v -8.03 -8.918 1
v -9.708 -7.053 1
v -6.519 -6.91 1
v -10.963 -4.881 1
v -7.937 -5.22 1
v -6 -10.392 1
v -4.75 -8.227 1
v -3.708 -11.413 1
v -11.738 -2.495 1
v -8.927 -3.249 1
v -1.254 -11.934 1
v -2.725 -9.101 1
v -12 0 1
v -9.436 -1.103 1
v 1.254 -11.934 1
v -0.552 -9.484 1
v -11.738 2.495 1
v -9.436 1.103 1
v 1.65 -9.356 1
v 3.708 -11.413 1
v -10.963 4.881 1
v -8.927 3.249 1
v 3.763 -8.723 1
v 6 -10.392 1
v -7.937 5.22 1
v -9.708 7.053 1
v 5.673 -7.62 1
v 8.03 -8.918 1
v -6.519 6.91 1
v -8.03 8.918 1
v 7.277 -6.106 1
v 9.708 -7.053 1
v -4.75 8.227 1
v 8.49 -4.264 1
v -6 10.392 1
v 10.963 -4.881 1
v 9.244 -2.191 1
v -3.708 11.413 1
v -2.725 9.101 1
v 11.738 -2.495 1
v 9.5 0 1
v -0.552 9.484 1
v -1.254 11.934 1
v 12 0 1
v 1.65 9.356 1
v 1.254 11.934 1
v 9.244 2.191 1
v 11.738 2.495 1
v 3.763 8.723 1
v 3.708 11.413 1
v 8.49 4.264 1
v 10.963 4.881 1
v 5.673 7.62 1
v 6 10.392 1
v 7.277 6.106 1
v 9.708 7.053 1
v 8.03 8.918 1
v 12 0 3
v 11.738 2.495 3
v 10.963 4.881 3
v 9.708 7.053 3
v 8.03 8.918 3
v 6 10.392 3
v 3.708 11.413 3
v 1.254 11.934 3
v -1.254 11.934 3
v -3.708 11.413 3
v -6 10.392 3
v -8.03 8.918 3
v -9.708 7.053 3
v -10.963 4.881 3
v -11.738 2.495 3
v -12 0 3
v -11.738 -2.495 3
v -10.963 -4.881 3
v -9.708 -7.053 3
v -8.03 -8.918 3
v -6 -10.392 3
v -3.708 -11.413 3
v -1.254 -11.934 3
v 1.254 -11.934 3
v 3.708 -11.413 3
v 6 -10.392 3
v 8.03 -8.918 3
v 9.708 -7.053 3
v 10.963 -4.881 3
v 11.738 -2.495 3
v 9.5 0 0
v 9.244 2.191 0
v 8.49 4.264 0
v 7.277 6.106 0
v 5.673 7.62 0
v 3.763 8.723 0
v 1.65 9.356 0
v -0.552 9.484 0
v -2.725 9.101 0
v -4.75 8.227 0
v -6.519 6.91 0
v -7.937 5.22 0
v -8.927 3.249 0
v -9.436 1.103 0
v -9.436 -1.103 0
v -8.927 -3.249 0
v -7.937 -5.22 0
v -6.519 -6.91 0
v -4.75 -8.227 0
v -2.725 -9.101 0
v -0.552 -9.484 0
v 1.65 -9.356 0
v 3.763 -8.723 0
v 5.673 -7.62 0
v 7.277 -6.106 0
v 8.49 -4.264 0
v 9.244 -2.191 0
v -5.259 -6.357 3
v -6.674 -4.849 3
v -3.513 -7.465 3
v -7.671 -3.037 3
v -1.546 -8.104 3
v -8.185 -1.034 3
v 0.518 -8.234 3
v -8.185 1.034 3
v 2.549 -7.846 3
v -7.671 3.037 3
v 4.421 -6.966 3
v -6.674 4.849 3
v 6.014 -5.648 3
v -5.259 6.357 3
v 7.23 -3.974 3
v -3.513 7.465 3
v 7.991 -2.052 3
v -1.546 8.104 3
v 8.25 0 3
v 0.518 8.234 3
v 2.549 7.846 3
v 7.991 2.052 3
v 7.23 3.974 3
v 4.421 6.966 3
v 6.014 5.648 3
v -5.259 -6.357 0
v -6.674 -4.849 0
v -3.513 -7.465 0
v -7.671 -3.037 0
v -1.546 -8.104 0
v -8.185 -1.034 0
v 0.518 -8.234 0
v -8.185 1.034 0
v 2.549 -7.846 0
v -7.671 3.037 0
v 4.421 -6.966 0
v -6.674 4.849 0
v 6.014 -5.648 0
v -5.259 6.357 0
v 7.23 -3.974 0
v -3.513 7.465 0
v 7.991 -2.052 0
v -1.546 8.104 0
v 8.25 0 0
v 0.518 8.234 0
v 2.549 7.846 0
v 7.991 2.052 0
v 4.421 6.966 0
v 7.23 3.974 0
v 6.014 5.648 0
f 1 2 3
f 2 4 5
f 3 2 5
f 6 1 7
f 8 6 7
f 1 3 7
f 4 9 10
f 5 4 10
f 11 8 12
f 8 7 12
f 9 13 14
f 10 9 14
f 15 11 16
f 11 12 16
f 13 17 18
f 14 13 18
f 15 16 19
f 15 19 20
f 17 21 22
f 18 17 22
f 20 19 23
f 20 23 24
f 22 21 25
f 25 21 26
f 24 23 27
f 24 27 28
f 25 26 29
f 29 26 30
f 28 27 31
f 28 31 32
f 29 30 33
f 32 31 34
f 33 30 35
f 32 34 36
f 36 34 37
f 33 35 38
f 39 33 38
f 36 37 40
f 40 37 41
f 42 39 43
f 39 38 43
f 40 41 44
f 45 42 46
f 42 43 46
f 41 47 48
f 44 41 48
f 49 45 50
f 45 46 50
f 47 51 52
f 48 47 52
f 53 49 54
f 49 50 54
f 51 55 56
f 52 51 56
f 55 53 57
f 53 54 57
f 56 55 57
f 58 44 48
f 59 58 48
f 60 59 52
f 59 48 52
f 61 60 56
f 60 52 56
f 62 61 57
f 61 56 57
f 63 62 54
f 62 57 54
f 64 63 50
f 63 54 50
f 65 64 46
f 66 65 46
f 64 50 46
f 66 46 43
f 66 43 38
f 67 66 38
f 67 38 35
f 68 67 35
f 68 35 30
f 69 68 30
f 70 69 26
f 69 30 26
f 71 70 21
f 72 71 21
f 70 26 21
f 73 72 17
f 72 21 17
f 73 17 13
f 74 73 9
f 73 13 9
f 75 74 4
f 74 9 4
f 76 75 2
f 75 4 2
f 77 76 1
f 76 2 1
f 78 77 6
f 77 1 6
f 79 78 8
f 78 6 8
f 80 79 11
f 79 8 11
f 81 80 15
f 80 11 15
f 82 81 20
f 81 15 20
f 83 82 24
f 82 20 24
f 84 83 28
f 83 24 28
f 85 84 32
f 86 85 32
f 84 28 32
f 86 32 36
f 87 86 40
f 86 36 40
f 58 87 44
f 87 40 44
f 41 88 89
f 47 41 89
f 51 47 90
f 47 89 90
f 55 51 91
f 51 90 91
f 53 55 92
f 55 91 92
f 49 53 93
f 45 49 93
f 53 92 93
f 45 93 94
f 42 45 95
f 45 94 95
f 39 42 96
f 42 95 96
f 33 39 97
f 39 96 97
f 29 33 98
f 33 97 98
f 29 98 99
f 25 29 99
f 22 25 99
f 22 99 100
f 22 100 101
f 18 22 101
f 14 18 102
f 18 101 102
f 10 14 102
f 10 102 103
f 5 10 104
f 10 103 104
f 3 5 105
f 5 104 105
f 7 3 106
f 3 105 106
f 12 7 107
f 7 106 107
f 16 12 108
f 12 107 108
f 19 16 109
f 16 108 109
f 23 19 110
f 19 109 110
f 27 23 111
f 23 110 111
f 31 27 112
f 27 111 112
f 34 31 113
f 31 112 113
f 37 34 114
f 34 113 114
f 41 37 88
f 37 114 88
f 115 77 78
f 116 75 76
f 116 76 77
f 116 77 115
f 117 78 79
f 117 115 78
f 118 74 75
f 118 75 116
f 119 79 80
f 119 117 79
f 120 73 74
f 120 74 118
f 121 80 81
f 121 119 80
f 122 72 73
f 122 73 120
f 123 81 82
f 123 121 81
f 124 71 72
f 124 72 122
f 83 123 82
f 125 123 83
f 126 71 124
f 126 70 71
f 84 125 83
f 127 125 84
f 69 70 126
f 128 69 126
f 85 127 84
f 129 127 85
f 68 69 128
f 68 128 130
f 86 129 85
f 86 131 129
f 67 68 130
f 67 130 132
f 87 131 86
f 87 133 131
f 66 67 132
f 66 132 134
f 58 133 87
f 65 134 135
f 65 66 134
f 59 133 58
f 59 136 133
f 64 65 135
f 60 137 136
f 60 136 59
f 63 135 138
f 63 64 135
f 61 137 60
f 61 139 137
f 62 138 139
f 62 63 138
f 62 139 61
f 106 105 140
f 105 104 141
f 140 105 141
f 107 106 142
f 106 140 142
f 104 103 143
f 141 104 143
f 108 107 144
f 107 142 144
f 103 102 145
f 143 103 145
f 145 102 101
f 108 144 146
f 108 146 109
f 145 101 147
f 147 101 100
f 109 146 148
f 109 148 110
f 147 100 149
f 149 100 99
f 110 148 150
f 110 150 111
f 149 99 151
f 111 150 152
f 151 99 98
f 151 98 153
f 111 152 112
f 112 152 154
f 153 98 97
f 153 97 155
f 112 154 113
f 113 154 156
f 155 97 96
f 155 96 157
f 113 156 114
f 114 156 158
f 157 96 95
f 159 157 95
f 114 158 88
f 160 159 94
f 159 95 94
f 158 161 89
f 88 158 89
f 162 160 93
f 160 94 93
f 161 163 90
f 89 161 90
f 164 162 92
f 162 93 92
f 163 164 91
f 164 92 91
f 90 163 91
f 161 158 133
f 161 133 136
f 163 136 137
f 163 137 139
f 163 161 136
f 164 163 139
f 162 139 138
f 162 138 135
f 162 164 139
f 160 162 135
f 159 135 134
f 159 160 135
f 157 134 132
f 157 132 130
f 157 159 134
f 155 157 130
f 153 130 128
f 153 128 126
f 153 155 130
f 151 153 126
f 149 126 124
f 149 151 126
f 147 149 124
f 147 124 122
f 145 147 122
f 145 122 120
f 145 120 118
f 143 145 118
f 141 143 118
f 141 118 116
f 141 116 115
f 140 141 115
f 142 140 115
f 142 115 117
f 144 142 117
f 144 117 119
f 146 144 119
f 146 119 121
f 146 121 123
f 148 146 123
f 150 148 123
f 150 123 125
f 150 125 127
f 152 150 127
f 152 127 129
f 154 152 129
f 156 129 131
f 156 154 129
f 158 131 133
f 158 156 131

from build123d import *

# Parameters (mm, degrees)
TUBE001_R     = 9.5
TUBE001_R_2   = 8.25
TUBE001_DEPTH = 1
TUBE_R        = 12
TUBE_R_2      = 8.25
TUBE_DEPTH    = 2


with BuildPart() as tube001:
    # Tube001 → Tube001 (new body)
    with BuildSketch(Plane.XY):
        Circle(TUBE001_R)
        Circle(TUBE001_R_2, mode=Mode.SUBTRACT)
    extrude(amount=TUBE001_DEPTH)


with BuildPart() as fusion:
    # Tube → Tube (new body)
    with BuildSketch(Plane.XY.offset(1)):
        Circle(TUBE_R)
        Circle(TUBE_R_2, mode=Mode.SUBTRACT)
    extrude(amount=TUBE_DEPTH)

    # Fusion: union Tube001
    add(tube001.part)


solid = fusion.part
